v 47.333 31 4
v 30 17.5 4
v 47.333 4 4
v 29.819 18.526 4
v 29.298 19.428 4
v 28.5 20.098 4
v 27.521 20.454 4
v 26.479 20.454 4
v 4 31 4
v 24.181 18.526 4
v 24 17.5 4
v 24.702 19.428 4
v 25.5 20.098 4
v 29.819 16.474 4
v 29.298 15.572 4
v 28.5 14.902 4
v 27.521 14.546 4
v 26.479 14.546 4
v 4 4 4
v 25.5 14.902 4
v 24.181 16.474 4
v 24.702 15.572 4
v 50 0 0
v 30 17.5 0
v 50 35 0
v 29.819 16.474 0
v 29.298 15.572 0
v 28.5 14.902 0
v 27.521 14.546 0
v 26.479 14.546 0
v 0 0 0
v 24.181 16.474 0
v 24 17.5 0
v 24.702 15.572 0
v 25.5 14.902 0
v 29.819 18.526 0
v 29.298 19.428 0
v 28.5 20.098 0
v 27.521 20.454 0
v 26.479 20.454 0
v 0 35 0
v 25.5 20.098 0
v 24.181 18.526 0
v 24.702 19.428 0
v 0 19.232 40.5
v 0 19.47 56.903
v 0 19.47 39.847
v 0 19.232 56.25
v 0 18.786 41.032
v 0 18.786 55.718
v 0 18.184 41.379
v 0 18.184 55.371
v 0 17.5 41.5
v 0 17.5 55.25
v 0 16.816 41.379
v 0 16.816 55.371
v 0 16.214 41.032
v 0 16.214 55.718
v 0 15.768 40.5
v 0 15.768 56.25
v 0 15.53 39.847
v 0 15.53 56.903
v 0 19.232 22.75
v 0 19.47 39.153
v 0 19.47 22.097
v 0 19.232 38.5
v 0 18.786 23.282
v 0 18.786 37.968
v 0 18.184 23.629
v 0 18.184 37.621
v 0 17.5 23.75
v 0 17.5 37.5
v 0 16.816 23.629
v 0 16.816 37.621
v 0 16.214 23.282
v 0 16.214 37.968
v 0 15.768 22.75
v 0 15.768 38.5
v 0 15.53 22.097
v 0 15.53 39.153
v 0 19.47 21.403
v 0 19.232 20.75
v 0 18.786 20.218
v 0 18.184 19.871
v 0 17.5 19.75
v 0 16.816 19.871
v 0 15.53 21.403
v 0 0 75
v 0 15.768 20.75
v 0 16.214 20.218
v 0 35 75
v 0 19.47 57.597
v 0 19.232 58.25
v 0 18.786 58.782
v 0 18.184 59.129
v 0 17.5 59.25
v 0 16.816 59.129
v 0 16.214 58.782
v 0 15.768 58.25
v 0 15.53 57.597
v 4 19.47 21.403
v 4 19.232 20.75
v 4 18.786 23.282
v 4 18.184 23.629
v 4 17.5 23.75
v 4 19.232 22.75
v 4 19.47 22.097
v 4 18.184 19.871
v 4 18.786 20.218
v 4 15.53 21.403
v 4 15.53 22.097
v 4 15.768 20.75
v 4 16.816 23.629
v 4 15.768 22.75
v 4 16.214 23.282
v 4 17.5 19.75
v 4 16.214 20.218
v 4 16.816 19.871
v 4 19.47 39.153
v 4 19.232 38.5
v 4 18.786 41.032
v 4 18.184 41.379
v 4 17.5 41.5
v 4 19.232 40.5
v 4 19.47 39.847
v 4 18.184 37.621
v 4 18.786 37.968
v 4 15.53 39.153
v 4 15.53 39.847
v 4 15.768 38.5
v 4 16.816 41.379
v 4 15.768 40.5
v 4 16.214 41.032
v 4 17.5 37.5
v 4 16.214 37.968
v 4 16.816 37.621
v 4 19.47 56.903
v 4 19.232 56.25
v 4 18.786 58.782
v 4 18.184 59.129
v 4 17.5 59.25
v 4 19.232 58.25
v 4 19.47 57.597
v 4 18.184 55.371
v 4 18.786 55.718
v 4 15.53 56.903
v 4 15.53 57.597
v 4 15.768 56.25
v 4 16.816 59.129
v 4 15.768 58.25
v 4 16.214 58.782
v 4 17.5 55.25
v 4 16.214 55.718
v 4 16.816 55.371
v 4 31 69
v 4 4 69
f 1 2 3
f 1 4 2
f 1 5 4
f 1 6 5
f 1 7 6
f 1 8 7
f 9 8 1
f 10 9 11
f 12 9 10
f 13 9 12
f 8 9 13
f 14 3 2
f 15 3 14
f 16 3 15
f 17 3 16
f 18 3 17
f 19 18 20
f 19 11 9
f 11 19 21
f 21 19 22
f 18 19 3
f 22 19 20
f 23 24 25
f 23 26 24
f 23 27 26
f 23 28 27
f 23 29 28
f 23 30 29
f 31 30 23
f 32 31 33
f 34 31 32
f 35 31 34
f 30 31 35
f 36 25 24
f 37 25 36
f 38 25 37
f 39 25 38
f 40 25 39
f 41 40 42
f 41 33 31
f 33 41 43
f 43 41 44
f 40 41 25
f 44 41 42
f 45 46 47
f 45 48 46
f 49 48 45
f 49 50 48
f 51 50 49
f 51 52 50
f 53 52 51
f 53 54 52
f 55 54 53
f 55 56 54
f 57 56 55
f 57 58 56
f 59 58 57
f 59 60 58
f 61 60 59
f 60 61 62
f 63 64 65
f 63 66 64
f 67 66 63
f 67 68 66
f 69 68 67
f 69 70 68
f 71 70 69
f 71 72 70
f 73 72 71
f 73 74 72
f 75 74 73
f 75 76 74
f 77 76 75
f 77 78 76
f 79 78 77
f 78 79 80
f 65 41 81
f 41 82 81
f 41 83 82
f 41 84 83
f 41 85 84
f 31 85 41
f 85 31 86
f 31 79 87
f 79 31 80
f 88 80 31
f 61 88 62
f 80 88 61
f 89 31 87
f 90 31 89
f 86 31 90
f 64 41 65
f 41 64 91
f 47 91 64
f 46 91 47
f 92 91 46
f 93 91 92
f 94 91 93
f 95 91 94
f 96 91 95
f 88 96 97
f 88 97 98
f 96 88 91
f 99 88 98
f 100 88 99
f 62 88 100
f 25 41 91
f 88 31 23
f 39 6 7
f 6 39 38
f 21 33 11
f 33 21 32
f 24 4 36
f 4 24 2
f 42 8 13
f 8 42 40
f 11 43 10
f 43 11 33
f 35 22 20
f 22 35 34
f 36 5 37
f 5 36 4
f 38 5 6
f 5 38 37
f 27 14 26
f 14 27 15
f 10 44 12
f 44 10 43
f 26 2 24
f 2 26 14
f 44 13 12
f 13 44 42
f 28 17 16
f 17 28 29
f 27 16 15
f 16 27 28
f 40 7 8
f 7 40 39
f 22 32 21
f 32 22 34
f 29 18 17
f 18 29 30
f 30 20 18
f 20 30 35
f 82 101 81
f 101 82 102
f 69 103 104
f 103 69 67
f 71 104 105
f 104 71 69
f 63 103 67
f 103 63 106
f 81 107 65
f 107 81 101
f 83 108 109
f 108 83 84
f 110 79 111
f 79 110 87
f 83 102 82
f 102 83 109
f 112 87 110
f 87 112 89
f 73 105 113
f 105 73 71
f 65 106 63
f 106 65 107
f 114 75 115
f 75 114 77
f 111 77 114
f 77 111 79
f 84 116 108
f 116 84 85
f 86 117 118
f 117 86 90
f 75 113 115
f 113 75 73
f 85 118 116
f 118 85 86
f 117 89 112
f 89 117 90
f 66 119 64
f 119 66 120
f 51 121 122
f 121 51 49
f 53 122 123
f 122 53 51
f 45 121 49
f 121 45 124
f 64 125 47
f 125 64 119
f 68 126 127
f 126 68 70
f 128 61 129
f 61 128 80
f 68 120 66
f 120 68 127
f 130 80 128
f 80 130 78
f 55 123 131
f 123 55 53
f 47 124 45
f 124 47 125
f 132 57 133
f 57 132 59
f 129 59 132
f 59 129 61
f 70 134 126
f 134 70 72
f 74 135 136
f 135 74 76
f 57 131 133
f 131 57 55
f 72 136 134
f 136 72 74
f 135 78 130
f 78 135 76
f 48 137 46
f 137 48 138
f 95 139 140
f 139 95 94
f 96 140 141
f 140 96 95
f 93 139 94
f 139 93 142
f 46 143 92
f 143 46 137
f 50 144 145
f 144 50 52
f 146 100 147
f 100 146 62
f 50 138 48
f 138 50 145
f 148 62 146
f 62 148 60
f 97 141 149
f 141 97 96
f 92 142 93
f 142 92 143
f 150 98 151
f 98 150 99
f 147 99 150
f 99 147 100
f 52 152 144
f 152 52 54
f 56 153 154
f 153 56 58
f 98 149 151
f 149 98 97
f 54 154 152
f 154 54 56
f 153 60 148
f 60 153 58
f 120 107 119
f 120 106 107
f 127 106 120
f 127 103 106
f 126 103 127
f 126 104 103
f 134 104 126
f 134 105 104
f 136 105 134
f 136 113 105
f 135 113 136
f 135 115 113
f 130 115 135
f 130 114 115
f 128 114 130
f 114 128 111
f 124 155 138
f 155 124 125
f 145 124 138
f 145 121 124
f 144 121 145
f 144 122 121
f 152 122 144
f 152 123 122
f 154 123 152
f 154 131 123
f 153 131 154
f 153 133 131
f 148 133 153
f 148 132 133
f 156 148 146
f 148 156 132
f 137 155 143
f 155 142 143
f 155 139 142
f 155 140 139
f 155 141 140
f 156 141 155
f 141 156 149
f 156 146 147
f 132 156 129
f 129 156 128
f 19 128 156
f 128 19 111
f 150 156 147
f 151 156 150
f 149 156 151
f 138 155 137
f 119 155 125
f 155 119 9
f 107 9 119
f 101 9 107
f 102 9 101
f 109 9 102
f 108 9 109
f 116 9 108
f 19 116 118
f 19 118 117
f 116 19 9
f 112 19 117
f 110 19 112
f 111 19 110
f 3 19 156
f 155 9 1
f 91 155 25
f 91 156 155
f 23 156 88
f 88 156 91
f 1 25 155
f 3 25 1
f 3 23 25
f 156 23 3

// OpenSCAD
module xhole_plate(size, h_dm, h_num, margin) {
    difference(){
        cube(size);
        h_distance = (size.x - margin) / (h_num + 1);
        for (x = [1:h_num])
        translate ([
            margin + x * h_distance,
            size.y/2,
            -1
        ]) cylinder( d = h_dm, h = size.z + 2, $fn=18);
    }		
}
module shelf_bracket(side_a, side_b, width, thickness) {
difference() {
union() {
	// side A
	xhole_plate(
		[side_a[0], width, thickness],
		side_a[1],
		side_a[2],
		thickness
	);
	// side B
    translate([thickness,0,0])
    rotate([0,-90,0])
	xhole_plate(
		[side_b[0], width, thickness],
		side_b[1],
		side_b[2],
		thickness
	);
	// stringer
	cube([side_a[0], thickness, side_b[0]]);
	translate([0, width - thickness, 0])
	cube([side_a[0], thickness, side_b[0]]);
    }
    diag  = sqrt( pow(side_a[0], 2) + pow(side_b[0], 2) );
    //angle = asin( side_a[0] / diag );
    angle = atan(side_a[0]/side_b[0]);

    translate( [side_a[0], -1, 0] )
    rotate( [0, -angle, 0] )
    cube( [diag, width + 2, diag + 2] );
}
}
module output(templates = false) {
	if (templates) {
		projection(cut = true)
		children(0);		
		translate( [-0.01, 0, 0] )
		projection(cut = true)
		rotate( [0, -90, 0] )
		children(0);		
	} else {
		children(0);
	}
}
//projection(cut = true)
//rotate( [0, -90, 0] )
output(templates = false)
shelf_bracket(
//[length, hole size, number of holes]
  side_a    = [50, 6, 1],
  side_b    = [75, 4, 3],
  width     = 35,
  thickness = 4
);
